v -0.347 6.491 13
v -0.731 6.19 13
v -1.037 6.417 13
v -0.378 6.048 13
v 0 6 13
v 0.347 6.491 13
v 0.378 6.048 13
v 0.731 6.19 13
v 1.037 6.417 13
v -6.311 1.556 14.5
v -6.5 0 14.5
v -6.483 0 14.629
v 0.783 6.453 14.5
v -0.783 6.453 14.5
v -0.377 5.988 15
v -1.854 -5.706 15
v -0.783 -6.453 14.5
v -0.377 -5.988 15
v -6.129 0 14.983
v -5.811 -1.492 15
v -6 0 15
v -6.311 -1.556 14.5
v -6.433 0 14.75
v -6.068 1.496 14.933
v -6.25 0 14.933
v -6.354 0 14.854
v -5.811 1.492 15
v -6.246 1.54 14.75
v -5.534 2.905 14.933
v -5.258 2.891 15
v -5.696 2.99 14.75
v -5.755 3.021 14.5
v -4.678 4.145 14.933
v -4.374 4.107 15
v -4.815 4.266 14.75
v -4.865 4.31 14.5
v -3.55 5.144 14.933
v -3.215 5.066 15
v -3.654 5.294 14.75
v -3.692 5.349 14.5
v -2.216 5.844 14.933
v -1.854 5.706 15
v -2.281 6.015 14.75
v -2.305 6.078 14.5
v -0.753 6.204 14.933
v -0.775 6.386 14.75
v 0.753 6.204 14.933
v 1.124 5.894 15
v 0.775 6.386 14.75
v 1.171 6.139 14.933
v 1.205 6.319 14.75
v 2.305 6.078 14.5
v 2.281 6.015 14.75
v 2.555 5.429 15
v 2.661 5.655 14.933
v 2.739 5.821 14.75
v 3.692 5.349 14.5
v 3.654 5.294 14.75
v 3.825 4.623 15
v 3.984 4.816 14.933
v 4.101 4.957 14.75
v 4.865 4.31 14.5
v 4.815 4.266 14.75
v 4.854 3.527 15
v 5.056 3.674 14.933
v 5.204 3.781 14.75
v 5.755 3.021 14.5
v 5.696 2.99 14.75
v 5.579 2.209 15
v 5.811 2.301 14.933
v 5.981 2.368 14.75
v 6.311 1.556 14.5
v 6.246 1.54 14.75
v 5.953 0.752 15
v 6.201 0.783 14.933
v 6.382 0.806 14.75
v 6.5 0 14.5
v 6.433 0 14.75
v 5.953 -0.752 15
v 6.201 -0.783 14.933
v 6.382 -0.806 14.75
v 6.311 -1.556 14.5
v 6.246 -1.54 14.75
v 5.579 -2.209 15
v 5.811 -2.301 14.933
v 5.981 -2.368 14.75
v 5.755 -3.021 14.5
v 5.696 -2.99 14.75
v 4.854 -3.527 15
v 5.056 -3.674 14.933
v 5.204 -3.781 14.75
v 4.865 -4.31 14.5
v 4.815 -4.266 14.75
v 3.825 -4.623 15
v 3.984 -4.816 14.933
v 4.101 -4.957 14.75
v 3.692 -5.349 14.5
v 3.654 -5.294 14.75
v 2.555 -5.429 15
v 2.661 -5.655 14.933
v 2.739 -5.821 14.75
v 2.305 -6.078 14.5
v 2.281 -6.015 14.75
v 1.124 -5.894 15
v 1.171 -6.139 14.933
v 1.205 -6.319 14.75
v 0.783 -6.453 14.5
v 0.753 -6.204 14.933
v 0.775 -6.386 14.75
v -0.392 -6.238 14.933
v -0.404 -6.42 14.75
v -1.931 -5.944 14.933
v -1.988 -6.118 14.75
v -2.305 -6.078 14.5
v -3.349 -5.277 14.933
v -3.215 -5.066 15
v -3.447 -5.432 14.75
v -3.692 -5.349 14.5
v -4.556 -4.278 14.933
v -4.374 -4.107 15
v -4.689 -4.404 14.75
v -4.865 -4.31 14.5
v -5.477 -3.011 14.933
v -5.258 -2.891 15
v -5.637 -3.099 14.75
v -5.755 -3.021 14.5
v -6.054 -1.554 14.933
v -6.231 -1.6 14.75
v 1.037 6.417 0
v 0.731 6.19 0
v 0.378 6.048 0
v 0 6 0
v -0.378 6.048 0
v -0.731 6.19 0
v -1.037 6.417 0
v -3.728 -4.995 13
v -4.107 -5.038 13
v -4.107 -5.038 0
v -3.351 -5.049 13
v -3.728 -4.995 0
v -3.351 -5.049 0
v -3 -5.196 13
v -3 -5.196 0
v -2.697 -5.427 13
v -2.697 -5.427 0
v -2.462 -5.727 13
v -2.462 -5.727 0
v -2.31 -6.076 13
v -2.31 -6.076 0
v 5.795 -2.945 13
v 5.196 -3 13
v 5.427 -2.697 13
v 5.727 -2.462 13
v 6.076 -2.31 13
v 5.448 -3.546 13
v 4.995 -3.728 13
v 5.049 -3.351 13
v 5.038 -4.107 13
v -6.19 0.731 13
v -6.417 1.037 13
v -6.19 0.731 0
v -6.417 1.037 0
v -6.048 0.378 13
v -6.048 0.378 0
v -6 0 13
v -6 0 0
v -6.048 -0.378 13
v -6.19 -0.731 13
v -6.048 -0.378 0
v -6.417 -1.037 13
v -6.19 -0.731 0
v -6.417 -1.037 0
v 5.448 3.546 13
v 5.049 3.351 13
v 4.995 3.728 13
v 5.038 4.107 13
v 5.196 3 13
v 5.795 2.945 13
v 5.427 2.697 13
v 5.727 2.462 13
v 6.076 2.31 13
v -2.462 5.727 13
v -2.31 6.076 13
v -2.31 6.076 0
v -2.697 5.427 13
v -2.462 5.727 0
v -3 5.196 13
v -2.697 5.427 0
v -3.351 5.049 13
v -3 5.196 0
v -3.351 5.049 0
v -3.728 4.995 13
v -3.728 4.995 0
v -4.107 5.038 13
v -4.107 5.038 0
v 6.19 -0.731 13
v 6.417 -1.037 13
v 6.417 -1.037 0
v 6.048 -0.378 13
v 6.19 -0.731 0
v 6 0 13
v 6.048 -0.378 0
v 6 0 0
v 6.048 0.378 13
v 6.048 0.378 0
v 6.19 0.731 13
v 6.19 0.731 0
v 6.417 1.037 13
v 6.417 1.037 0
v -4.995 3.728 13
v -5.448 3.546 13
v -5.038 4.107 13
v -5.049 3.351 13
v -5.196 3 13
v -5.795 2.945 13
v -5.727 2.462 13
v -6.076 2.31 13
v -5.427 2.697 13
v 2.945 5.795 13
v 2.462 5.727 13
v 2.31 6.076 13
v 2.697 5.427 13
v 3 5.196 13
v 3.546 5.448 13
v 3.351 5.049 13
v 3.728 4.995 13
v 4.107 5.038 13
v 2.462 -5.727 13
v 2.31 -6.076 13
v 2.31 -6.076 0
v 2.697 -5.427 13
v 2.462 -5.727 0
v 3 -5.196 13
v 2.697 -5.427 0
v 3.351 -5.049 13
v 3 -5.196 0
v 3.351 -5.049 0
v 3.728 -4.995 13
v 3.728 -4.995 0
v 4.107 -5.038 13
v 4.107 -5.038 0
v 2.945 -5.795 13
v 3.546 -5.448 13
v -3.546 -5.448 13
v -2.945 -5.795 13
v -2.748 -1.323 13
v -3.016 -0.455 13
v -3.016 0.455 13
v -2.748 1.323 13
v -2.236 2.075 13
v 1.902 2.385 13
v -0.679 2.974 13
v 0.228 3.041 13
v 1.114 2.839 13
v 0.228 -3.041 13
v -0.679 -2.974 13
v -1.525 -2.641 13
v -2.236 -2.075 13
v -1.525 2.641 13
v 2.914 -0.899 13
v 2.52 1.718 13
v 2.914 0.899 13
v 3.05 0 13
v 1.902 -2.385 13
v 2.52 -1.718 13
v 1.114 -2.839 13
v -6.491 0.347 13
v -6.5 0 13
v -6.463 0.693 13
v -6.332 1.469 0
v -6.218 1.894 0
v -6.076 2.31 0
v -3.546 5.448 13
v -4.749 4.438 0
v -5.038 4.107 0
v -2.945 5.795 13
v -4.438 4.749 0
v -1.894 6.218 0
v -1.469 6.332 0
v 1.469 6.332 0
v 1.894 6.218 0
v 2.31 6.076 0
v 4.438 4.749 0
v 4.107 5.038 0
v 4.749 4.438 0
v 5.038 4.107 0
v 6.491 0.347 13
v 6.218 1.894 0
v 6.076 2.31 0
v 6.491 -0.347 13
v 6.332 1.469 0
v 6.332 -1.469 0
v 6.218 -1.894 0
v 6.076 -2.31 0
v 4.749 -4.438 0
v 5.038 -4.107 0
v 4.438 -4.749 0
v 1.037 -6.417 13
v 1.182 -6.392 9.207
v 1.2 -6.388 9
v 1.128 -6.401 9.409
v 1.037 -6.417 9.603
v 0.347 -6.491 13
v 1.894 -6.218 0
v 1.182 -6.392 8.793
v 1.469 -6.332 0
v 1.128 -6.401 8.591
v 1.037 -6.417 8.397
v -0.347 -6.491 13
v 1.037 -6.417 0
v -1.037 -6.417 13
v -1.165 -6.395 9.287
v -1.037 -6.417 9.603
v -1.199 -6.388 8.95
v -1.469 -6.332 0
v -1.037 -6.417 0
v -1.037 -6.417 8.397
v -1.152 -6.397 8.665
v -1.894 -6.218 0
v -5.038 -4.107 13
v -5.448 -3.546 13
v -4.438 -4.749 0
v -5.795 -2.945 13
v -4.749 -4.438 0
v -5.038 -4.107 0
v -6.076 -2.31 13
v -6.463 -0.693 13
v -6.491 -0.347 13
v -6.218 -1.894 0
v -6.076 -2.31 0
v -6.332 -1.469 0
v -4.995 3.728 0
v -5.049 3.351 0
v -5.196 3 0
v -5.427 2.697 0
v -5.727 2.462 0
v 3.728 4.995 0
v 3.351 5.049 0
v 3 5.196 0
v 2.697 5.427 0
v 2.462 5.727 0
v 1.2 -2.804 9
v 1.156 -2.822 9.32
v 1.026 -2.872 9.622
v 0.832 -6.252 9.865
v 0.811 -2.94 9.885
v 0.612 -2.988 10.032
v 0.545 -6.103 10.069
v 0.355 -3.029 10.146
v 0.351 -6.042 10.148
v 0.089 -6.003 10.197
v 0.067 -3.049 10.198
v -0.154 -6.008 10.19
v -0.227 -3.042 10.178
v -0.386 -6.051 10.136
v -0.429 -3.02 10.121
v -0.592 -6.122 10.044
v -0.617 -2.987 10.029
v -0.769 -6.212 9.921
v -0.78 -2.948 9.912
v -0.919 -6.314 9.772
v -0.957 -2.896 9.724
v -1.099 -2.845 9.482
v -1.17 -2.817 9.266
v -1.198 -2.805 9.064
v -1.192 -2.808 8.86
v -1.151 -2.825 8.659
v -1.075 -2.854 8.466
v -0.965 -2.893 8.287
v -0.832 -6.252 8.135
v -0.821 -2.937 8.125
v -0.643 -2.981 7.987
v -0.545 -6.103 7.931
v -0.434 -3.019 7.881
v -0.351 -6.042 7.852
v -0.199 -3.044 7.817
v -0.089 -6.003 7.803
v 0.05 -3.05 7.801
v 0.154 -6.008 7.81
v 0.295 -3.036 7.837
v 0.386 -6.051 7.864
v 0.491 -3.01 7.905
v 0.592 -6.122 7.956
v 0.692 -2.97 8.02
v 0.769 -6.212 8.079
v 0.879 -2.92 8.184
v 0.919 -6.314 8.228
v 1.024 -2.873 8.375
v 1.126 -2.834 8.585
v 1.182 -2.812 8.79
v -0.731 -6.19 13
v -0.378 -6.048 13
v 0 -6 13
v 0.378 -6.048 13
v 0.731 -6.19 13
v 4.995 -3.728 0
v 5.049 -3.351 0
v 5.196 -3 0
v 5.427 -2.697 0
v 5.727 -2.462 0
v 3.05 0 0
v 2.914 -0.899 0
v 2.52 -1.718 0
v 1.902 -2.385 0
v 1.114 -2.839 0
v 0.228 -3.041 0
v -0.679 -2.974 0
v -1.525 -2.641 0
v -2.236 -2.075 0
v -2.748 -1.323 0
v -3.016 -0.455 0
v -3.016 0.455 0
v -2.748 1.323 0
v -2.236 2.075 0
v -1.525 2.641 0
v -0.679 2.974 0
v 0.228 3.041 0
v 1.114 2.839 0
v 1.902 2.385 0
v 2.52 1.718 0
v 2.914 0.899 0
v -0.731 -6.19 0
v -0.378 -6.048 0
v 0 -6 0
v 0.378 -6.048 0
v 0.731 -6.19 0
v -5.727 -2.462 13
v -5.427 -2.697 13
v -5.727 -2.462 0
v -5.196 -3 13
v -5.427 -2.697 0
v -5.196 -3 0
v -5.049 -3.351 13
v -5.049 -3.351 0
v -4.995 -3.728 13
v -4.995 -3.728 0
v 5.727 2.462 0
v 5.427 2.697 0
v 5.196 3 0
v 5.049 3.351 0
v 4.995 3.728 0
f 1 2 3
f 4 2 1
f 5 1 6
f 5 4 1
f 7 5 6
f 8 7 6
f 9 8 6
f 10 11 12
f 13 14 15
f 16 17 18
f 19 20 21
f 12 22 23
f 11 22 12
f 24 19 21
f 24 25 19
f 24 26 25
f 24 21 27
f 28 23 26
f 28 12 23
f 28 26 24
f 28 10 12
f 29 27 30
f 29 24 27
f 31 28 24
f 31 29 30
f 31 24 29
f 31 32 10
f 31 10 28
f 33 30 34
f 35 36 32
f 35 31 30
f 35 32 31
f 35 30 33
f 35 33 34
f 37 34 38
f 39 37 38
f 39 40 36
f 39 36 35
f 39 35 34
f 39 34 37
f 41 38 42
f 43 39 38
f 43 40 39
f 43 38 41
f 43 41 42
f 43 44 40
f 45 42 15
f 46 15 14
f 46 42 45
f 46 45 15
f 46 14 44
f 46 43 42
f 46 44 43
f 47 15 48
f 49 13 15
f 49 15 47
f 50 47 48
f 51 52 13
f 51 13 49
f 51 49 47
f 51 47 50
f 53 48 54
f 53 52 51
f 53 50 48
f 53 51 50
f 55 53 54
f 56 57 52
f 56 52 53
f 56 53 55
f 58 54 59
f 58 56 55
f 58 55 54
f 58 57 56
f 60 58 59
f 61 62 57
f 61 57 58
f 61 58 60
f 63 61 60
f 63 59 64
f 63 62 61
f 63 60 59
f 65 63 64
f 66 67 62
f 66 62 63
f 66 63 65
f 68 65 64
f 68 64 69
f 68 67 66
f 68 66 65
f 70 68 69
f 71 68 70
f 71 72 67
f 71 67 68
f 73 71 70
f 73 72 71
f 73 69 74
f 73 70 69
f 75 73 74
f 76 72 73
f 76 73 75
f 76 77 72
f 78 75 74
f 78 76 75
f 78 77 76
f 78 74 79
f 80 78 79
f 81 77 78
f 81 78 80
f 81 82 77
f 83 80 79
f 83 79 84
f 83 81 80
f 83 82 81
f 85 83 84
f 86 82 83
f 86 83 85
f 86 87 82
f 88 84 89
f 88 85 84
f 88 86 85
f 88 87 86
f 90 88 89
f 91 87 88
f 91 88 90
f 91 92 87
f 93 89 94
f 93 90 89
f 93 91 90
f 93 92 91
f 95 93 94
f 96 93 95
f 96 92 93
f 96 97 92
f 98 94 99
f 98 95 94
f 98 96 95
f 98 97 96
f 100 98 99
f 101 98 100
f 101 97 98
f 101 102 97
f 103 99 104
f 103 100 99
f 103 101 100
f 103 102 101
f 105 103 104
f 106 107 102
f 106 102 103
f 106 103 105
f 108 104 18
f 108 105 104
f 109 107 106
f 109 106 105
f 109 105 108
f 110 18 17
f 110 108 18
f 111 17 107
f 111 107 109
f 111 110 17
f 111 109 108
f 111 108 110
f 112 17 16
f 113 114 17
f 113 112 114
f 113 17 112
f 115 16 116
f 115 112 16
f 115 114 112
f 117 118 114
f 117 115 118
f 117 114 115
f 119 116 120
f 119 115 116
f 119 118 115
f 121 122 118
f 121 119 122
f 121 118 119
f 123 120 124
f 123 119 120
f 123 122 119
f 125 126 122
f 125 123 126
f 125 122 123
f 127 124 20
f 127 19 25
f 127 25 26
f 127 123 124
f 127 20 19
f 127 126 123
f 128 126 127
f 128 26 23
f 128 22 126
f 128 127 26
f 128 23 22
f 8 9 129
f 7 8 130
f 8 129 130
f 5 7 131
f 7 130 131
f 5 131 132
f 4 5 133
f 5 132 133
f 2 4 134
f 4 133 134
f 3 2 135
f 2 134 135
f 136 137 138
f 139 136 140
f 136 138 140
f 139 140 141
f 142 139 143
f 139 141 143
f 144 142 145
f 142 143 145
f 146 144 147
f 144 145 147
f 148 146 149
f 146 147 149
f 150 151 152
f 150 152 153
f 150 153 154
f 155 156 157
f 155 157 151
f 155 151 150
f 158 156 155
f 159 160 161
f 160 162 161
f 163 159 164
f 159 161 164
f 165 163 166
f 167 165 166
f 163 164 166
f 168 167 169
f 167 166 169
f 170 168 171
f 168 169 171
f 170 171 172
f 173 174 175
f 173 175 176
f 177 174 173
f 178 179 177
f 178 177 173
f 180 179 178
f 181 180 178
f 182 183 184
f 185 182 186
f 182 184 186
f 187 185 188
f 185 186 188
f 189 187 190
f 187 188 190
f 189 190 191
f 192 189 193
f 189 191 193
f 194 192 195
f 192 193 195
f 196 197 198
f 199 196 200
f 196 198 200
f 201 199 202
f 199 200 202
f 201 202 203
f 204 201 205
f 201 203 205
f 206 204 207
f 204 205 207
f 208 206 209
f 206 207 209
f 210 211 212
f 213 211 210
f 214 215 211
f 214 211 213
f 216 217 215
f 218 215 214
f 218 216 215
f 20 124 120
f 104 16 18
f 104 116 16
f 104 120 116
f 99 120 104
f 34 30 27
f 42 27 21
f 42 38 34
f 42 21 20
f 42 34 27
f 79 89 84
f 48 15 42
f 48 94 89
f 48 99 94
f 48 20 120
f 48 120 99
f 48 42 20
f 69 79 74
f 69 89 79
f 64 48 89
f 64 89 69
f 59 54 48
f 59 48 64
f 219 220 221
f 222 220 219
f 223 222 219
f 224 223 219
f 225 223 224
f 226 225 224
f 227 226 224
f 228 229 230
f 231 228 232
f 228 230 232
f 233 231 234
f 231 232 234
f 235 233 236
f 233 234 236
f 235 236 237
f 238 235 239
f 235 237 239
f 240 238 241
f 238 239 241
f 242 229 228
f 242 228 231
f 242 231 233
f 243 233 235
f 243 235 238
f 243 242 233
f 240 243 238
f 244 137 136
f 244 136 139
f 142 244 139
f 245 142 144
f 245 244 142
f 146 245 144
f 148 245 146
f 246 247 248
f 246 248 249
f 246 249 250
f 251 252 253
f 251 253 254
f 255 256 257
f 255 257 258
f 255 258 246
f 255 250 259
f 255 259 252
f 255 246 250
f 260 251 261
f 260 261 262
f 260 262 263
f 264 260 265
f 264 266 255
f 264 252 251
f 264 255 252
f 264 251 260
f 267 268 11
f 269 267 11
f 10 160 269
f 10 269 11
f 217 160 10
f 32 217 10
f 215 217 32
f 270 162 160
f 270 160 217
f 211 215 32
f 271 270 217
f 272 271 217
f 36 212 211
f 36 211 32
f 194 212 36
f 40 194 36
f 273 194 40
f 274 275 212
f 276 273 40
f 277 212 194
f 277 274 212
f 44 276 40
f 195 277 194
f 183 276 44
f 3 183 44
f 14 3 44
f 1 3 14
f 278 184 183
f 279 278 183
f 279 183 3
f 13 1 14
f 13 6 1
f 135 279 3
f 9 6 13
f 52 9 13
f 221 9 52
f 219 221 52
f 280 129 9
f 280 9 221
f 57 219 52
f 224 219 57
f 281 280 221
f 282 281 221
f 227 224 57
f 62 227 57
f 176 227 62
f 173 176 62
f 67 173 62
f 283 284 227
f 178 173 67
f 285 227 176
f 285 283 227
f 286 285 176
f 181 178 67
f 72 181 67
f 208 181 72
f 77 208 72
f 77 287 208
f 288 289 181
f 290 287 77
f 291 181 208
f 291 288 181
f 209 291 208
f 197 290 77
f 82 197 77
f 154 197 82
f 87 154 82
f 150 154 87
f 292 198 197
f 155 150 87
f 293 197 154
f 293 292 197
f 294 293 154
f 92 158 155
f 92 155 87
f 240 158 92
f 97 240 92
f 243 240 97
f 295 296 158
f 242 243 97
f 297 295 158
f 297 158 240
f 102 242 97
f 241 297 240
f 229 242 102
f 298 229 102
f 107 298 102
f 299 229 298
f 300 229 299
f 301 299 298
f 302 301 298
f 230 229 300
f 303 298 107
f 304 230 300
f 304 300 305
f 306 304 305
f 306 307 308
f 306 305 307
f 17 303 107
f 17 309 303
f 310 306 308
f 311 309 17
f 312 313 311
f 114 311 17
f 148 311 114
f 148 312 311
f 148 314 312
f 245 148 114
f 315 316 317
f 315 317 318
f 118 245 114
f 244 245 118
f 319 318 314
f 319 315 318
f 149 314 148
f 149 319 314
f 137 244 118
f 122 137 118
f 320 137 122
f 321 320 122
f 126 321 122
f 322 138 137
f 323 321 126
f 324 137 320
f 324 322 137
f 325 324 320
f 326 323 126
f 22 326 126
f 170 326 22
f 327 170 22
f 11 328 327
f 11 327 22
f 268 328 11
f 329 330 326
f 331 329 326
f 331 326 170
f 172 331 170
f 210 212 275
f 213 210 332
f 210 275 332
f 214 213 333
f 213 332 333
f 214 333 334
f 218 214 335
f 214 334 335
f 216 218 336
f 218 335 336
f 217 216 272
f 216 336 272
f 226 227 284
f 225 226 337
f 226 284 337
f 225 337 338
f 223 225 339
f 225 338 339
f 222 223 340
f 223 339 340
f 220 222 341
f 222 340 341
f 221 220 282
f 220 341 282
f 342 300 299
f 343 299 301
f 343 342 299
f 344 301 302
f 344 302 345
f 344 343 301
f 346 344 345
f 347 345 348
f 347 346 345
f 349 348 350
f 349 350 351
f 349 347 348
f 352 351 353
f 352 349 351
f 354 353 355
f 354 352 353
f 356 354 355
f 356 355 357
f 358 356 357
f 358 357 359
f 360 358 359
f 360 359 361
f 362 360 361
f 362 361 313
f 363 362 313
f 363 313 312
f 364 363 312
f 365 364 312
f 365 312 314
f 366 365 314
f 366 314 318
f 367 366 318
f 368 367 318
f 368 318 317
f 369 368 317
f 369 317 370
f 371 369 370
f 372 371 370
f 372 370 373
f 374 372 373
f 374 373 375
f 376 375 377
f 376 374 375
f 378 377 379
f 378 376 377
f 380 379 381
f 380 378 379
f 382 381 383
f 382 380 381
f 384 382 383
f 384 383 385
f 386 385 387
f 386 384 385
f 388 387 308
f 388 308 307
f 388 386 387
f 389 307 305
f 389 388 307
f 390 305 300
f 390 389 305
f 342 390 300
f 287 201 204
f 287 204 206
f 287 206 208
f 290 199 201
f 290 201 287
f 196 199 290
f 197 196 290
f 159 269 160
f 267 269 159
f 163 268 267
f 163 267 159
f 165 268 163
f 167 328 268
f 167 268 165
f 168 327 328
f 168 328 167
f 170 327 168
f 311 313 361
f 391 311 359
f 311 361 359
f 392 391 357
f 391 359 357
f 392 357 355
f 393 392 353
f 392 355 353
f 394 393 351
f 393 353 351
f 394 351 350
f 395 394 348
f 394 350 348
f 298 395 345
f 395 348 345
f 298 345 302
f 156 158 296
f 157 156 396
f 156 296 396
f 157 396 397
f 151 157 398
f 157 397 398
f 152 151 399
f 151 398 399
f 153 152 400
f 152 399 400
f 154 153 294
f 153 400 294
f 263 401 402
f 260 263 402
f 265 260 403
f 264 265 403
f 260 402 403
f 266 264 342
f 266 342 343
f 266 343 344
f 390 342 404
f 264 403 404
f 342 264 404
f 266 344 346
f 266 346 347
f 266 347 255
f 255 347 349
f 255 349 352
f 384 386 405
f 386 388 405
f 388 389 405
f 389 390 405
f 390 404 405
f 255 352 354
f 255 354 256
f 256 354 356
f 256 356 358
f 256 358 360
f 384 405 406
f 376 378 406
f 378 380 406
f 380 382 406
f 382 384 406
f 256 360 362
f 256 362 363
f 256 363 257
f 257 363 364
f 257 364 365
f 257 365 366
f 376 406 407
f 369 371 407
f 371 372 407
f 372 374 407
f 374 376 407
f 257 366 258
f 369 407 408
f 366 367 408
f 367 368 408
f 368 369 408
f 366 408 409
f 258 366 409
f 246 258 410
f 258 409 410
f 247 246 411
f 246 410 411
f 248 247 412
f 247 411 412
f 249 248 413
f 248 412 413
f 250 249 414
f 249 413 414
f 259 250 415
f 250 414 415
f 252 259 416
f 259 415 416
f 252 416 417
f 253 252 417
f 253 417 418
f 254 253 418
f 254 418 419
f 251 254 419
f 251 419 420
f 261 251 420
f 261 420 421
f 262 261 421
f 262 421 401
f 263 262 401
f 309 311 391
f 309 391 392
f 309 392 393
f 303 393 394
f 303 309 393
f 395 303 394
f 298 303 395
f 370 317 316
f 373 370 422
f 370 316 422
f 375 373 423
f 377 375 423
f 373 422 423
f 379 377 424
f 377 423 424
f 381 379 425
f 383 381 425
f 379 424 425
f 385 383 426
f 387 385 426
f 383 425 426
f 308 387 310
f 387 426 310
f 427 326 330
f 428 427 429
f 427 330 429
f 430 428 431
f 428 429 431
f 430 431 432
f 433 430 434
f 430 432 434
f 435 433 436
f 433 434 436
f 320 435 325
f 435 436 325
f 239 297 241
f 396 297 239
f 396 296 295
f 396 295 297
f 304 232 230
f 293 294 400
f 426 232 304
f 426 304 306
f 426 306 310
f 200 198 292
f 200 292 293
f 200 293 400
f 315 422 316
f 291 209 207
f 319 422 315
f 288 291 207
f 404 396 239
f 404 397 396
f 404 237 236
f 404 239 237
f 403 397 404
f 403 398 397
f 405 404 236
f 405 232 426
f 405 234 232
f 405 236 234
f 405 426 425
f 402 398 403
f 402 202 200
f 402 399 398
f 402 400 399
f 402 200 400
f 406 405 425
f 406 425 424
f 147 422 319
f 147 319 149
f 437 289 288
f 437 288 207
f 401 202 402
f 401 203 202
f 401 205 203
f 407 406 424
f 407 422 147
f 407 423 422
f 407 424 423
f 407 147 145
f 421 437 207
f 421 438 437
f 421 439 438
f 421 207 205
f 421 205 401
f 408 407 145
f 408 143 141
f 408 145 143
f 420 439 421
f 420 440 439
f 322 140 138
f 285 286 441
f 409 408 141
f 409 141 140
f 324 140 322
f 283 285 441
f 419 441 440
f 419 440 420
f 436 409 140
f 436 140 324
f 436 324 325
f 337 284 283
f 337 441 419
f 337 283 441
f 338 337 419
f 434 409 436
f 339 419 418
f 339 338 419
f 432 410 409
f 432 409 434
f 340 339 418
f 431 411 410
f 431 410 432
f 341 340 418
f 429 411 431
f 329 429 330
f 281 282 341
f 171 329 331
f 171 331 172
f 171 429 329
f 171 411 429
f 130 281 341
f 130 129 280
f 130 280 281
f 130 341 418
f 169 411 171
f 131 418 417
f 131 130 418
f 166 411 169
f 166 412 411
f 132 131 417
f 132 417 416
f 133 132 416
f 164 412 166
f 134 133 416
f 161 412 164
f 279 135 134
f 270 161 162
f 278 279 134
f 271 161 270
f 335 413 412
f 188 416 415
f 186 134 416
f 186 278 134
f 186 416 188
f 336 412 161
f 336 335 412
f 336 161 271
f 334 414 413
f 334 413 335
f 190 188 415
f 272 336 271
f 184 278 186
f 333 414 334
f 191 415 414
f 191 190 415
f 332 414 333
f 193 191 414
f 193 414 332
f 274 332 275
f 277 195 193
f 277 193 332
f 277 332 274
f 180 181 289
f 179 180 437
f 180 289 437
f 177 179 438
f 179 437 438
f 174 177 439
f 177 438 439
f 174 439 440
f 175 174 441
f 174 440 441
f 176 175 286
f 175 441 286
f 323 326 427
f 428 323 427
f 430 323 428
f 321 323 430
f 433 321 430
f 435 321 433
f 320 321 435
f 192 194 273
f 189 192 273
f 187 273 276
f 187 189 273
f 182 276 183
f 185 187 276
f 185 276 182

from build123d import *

# Parameters (mm, degrees)
F2_R     = 3.05
F3_DEPTH = 13
F4_R     = 0.5
F5_R     = 1.2
F6_DEPTH = 7
F7_R     = 1.5
F8_DEPTH = 13


with BuildPart() as f1:
    # F0 (on Front) → F1 (revolve)
    with BuildSketch(Plane.XZ):
        Polygon((-5, 0), (0, 0), (0, 15), (-6.5, 15), (-6.5, 0), align=None)
    revolve(axis=Axis((0, 0, -3.667768), (0, 0, -1)))

    # F2 (on face) → F3 (cut)
    with BuildSketch(Plane(origin=(0, 0, 0), x_dir=(1, 0, 0), z_dir=(0, 0, -1))):
        Circle(F2_R)
    extrude(amount=-F3_DEPTH, mode=Mode.SUBTRACT)

    # F4
    f4_edges = [f1.edges().sort_by_distance(p)[0] for p in [
        (6.5, 0, 15),
    ]]
    fillet(f4_edges, radius=F4_R)

    # F5 (on Front) → F6 (cut)
    with BuildSketch(Plane.XZ):
        with Locations((0, 9)):
            Circle(F5_R)
    extrude(amount=F6_DEPTH, mode=Mode.SUBTRACT)

    # F7 (on face) → F8 (cut)
    with BuildSketch(Plane(origin=(0, 0, 0), x_dir=(1, 0, 0), z_dir=(0, 0, -1))):
        with Locations((-7.5, 0)):
            Circle(F7_R)
        with Locations((-6.495191, -3.75)):
            Circle(F7_R)
        with Locations((-3.75, -6.495191)):
            Circle(F7_R)
        with Locations((0, -7.5)):
            Circle(F7_R)
        with Locations((3.75, -6.495191)):
            Circle(F7_R)
        with Locations((6.495191, -3.75)):
            Circle(F7_R)
        with Locations((7.5, 0)):
            Circle(F7_R)
        with Locations((6.495191, 3.75)):
            Circle(F7_R)
        with Locations((3.75, 6.495191)):
            Circle(F7_R)
        with Locations((0, 7.5)):
            Circle(F7_R)
        with Locations((-3.75, 6.495191)):
            Circle(F7_R)
        with Locations((-6.495191, 3.75)):
            Circle(F7_R)
    extrude(amount=-F8_DEPTH, mode=Mode.SUBTRACT)


solid = f1.part
